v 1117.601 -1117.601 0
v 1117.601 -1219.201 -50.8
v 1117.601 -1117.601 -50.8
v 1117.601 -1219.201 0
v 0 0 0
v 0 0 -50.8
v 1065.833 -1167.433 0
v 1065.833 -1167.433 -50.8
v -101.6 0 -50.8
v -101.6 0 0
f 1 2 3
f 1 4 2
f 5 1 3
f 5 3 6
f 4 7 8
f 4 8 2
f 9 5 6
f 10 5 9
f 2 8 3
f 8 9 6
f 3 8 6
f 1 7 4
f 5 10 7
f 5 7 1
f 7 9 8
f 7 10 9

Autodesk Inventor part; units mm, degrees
ref_plane "YZ Plane" through (0, 0, 0) normal (1, 0, 0) x (0, 1, 0)
ref_plane "XZ Plane" through (0, 0, 0) normal (0, 1, 0) x (-1, 0, 0)
ref_plane "XY Plane" through (0, 0, 0) normal (0, 0, 1) x (1, 0, 0)
ref_plane "Work Plane1" through (0, 0, 0) normal (0, 0, 1) x (1, 0, 0)
sketch "Sketch1" plane through (0, 0, 0) normal (0, 0, 1) x (1, 0, 0)
  line L0 (0, 0) -> (-101.6, 0)
  line L1 (-101.6, 0) -> (1065.8333, -1167.4333)
  line L2 (1065.8333, -1167.4333) -> (1117.6006, -1219.2006)
  line L3 (1117.6006, -1219.2006) -> (1117.6006, -1117.6006)
  line L4 (1117.6006, -1117.6006) -> (0, 0)
  dimension "d1" = 101.6
  dimension "d2" = 1651
  dimension "d4" = 101.6
extrude "Extrusion1" add sketch "Sketch1" against normal blind 50.8
properties part number "2x4x67.88" material "Wood (Birch)"
